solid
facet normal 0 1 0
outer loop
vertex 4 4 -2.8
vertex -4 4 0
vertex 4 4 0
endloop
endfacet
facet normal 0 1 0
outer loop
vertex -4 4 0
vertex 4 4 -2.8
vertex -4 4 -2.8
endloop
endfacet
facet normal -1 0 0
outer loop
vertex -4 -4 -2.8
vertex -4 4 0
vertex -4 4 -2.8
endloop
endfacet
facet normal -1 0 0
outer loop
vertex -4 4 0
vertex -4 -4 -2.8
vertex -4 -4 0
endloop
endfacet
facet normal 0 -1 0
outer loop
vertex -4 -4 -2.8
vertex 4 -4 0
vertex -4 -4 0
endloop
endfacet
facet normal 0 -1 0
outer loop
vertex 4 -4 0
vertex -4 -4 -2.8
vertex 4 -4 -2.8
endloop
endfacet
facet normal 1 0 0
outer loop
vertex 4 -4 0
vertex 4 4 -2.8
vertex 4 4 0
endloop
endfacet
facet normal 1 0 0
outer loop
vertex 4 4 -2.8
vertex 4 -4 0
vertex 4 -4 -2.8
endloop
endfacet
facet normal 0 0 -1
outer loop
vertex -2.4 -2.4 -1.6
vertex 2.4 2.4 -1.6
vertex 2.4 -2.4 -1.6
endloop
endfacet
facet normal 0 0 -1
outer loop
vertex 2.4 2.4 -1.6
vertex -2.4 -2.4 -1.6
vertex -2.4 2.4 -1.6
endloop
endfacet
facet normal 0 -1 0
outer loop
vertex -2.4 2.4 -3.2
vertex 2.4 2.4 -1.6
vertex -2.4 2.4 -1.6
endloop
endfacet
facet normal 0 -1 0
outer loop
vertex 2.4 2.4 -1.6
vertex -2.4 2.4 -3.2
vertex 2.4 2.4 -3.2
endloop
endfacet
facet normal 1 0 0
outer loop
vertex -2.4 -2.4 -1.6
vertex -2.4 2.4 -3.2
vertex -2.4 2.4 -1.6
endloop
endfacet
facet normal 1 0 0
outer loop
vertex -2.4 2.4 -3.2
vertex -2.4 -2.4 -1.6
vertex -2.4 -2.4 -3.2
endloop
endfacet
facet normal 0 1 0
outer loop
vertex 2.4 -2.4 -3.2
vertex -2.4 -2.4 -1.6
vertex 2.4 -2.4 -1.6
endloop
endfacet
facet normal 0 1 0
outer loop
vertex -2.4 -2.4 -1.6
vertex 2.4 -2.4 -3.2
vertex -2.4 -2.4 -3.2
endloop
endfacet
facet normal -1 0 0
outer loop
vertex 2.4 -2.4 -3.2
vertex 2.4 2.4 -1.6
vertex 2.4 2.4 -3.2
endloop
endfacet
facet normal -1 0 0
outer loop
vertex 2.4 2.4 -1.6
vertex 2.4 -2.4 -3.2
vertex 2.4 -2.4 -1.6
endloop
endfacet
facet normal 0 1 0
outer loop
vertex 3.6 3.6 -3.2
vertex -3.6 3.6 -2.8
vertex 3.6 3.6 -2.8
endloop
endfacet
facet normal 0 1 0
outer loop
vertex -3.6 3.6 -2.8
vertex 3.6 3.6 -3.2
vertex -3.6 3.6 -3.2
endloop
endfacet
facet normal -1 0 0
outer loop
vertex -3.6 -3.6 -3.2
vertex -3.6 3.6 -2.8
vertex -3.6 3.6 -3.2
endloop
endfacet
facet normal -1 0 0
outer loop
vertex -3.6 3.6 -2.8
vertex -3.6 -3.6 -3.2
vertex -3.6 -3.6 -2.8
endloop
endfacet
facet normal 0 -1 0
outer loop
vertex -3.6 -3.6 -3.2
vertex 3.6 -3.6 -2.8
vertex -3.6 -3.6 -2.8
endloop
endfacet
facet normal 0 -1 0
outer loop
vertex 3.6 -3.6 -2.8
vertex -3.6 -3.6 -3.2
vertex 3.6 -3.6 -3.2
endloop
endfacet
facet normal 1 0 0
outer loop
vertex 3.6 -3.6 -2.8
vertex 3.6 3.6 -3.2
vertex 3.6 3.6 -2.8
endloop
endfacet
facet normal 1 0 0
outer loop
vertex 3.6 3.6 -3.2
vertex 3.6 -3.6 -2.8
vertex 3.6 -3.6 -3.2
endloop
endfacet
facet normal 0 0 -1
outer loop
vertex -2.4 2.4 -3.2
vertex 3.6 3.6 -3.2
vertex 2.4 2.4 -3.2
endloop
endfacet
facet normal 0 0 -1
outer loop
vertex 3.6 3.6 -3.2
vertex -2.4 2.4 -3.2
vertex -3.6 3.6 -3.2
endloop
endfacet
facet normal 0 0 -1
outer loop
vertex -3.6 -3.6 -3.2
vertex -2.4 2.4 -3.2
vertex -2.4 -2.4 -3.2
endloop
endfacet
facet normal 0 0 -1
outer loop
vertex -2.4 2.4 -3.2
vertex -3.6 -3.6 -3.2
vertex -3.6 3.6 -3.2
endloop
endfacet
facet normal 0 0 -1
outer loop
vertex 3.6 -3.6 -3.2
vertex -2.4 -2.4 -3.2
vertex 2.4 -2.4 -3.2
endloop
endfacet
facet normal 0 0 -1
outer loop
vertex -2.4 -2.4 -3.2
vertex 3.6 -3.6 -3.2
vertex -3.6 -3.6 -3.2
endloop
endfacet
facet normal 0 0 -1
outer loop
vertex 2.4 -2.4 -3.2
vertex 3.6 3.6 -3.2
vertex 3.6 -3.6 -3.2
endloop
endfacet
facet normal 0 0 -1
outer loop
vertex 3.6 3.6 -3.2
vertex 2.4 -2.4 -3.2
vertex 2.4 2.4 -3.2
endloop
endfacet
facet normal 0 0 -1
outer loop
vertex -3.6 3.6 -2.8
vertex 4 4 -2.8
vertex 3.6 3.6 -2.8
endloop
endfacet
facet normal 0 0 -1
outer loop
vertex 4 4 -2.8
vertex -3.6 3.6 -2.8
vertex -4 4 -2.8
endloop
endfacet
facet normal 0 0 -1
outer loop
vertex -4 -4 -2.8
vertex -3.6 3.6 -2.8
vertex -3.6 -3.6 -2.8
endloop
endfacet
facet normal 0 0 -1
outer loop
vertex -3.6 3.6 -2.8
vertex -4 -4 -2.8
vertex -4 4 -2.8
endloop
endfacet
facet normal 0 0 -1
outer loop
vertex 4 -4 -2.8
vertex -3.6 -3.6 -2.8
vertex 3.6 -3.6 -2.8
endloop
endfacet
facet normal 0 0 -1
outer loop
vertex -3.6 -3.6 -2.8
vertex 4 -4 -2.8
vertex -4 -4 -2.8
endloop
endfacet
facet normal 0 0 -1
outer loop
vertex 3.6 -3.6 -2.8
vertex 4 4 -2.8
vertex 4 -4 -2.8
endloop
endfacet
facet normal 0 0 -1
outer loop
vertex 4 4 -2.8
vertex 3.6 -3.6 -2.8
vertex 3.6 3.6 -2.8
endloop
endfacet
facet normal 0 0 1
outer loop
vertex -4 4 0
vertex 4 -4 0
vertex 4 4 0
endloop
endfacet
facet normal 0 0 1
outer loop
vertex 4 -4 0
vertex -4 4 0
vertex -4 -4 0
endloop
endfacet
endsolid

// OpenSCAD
// file: ../p/box5.scad
use <../lib.scad>
function ldraw_lib__box5() = [
// 0 Box with 5 Faces and All Edges
// 0 Name: box5.dat
// 0 Author: James Jessiman
// 0 !LDRAW_ORG Primitive UPDATE 2012-01
// 0 !LICENSE Licensed under CC BY 4.0 : see CAreadme.txt
// 
// 0 BFC CERTIFY CCW
  [0,"BFC","CERTIFY"],
  [0,"BFC","CCW"],
// 
// 0 !HISTORY 2002-04-03 [sbliss] Modified for BFC compliance
// 0 !HISTORY 2002-04-25 [PTadmin] Official Update 2002-02
// 0 !HISTORY 2007-06-24 [PTadmin] Header formatted for Contributor Agreement
// 0 !HISTORY 2008-07-01 [PTadmin] Official Update 2008-01
// 0 !HISTORY 2012-02-16 [Philo] Changed to CCW
// 0 !HISTORY 2012-03-30 [PTadmin] Official Update 2012-01
// 
// 
// 2 24 1 1 1 -1 1 1
  [2,24,1,1,1,-1,1,1],
// 2 24 -1 1 1 -1 1 -1
  [2,24,-1,1,1,-1,1,-1],
// 2 24 -1 1 -1 1 1 -1
  [2,24,-1,1,-1,1,1,-1],
// 2 24 1 1 -1 1 1 1
  [2,24,1,1,-1,1,1,1],
// 2 24 1 0 1 -1 0 1
  [2,24,1,0,1,-1,0,1],
// 2 24 -1 0 1 -1 0 -1
  [2,24,-1,0,1,-1,0,-1],
// 2 24 -1 0 -1 1 0 -1
  [2,24,-1,0,-1,1,0,-1],
// 2 24 1 0 -1 1 0 1
  [2,24,1,0,-1,1,0,1],
// 2 24 1 0 1 1 1 1
  [2,24,1,0,1,1,1,1],
// 2 24 -1 0 1 -1 1 1
  [2,24,-1,0,1,-1,1,1],
// 2 24 1 0 -1 1 1 -1
  [2,24,1,0,-1,1,1,-1],
// 2 24 -1 0 -1 -1 1 -1
  [2,24,-1,0,-1,-1,1,-1],
// 4 16 -1 1 1 1 1 1 1 1 -1 -1 1 -1
  [4,16,-1,1,1,1,1,1,1,1,-1,-1,1,-1],
// 4 16 -1 1 1 -1 0 1 1 0 1 1 1 1
  [4,16,-1,1,1,-1,0,1,1,0,1,1,1,1],
// 4 16 -1 1 -1 -1 0 -1 -1 0 1 -1 1 1
  [4,16,-1,1,-1,-1,0,-1,-1,0,1,-1,1,1],
// 4 16 1 1 -1 1 0 -1 -1 0 -1 -1 1 -1
  [4,16,1,1,-1,1,0,-1,-1,0,-1,-1,1,-1],
// 4 16 1 1 1 1 0 1 1 0 -1 1 1 -1
  [4,16,1,1,1,1,0,1,1,0,-1,1,1,-1],
];
module ldraw_lib__box5(step=0, col=false, unit=2/5, alt=false, line=0.2, solid=!$preview)
    makepoly(ldraw_lib__box5(), step=step, col=col, unit=unit, alt=alt, line=line, solid=solid);
ldraw_lib__box5(line=0.2);
// file: ../p/box4.scad
use <../lib.scad>
function ldraw_lib__box4() = [
// 0 Box with 4 Faces (2 Parallel Pairs) and All Edges
// 0 Name: box4.dat
// 0 Author: James Jessiman
// 0 !LDRAW_ORG Primitive UPDATE 2012-01
// 0 !LICENSE Licensed under CC BY 4.0 : see CAreadme.txt
// 
// 0 BFC CERTIFY CCW
  [0,"BFC","CERTIFY"],
  [0,"BFC","CCW"],
// 
// 0 !HISTORY 2002-04-03 [sbliss] Modified for BFC compliance
// 0 !HISTORY 2002-04-25 [PTadmin] Official Update 2002-02
// 0 !HISTORY 2007-06-24 [PTadmin] Header formatted for Contributor Agreement
// 0 !HISTORY 2008-07-01 [PTadmin] Official Update 2008-01
// 0 !HISTORY 2012-02-16 [Philo] Changed to CCW
// 0 !HISTORY 2012-03-30 [PTadmin] Official Update 2012-01
// 
// 
// 2 24 1 1 1 -1 1 1
  [2,24,1,1,1,-1,1,1],
// 2 24 -1 1 1 -1 1 -1
  [2,24,-1,1,1,-1,1,-1],
// 2 24 -1 1 -1 1 1 -1
  [2,24,-1,1,-1,1,1,-1],
// 2 24 1 1 -1 1 1 1
  [2,24,1,1,-1,1,1,1],
// 2 24 1 0 1 -1 0 1
  [2,24,1,0,1,-1,0,1],
// 2 24 -1 0 1 -1 0 -1
  [2,24,-1,0,1,-1,0,-1],
// 2 24 -1 0 -1 1 0 -1
  [2,24,-1,0,-1,1,0,-1],
// 2 24 1 0 -1 1 0 1
  [2,24,1,0,-1,1,0,1],
// 2 24 1 0 1 1 1 1
  [2,24,1,0,1,1,1,1],
// 2 24 -1 0 1 -1 1 1
  [2,24,-1,0,1,-1,1,1],
// 2 24 1 0 -1 1 1 -1
  [2,24,1,0,-1,1,1,-1],
// 2 24 -1 0 -1 -1 1 -1
  [2,24,-1,0,-1,-1,1,-1],
// 4 16 -1 1 1 -1 0 1 1 0 1 1 1 1
  [4,16,-1,1,1,-1,0,1,1,0,1,1,1,1],
// 4 16 -1 1 -1 -1 0 -1 -1 0 1 -1 1 1
  [4,16,-1,1,-1,-1,0,-1,-1,0,1,-1,1,1],
// 4 16 1 1 -1 1 0 -1 -1 0 -1 -1 1 -1
  [4,16,1,1,-1,1,0,-1,-1,0,-1,-1,1,-1],
// 4 16 1 1 1 1 0 1 1 0 -1 1 1 -1
  [4,16,1,1,1,1,0,1,1,0,-1,1,1,-1],
];
module ldraw_lib__box4(step=0, col=false, unit=2/5, alt=false, line=0.2, solid=!$preview)
    makepoly(ldraw_lib__box4(), step=step, col=col, unit=unit, alt=alt, line=line, solid=solid);
ldraw_lib__box4(line=0.2);
// file: s/3070bs01.scad
use <../../lib.scad>
use <../../p/box4.scad>
use <../../p/box5.scad>
function ldraw_lib__s__3070bs01() = [
// 0 ~Tile  1 x  1 with Groove without Top Face
// 0 Name: s\3070bs01.dat
// 0 Author: Chris Dee [cwdee]
// 0 !LDRAW_ORG Subpart UPDATE 2009-02
// 0 !LICENSE Licensed under CC BY 4.0 : see CAreadme.txt
// 
// 0 BFC CERTIFY CCW
  [0,"BFC","CERTIFY"],
  [0,"BFC","CCW"],
// 
// 0 !HISTORY 2009-09-03 [PTadmin] Official Update 2009-02
// 
// 
// 1 16 0 0 0 10 0 0 0 7 0 0 0 10 box4.dat
  [1,16,0,0,0,10,0,0,0,7,0,0,0,10, ldraw_lib__box4()],
// 0 BFC INVERTNEXT
  [0,"BFC","INVERTNEXT"],
// 1 16 0 8 0 6 0 0 0 -4 0 0 0 6 box5.dat
  [1,16,0,8,0,6,0,0,0,-4,0,0,0,6, ldraw_lib__box5()],
// 1 16 0 7 0 9 0 0 0 1 0 0 0 9 box4.dat
  [1,16,0,7,0,9,0,0,0,1,0,0,0,9, ldraw_lib__box4()],
// 
// 4 16 9 8 9 6 8 6 -6 8 6 -9 8 9
  [4,16,9,8,9,6,8,6,-6,8,6,-9,8,9],
// 4 16 -9 8 9 -6 8 6 -6 8 -6 -9 8 -9
  [4,16,-9,8,9,-6,8,6,-6,8,-6,-9,8,-9],
// 4 16 -9 8 -9 -6 8 -6 6 8 -6 9 8 -9
  [4,16,-9,8,-9,-6,8,-6,6,8,-6,9,8,-9],
// 4 16 9 8 -9 6 8 -6 6 8 6 9 8 9
  [4,16,9,8,-9,6,8,-6,6,8,6,9,8,9],
// 
// 4 16 10 7 10 9 7 9 -9 7 9 -10 7 10
  [4,16,10,7,10,9,7,9,-9,7,9,-10,7,10],
// 4 16 -10 7 10 -9 7 9 -9 7 -9 -10 7 -10
  [4,16,-10,7,10,-9,7,9,-9,7,-9,-10,7,-10],
// 4 16 -10 7 -10 -9 7 -9 9 7 -9 10 7 -10
  [4,16,-10,7,-10,-9,7,-9,9,7,-9,10,7,-10],
// 4 16 10 7 -10 9 7 -9 9 7 9 10 7 10
  [4,16,10,7,-10,9,7,-9,9,7,9,10,7,10],
// 0
];
module ldraw_lib__s__3070bs01(step=0, col=false, unit=2/5, alt=false, line=0.2, solid=!$preview)
    makepoly(ldraw_lib__s__3070bs01(), step=step, col=col, unit=unit, alt=alt, line=line, solid=solid);
ldraw_lib__s__3070bs01(line=0.2);
// file: 3070b.scad
use <../lib.scad>
use <s/3070bs01.scad>
function ldraw_lib__3070b() = [
// 0 Tile  1 x  1 with Groove
// 0 Name: 3070b.dat
// 0 Author: Chris Dee [cwdee]
// 0 !LDRAW_ORG Part UPDATE 2009-02
// 0 !LICENSE Licensed under CC BY 4.0 : see CAreadme.txt
// 
// 0 BFC CERTIFY CW
  [0,"BFC","CERTIFY"],
  [0,"BFC","CW"],
// 
// 0 !KEYWORDS BrickLink 3070
// 
// 0 !HISTORY 2009-09-03 [PTadmin] Official Update 2009-02
// 
// 
// 1 16 0 0 0 1 0 0 0 1 0 0 0 1 s\3070bs01.dat
  [1,16,0,0,0,1,0,0,0,1,0,0,0,1, ldraw_lib__s__3070bs01()],
// 4 16 10 0 10 10 0 -10 -10 0 -10 -10 0 10
  [4,16,10,0,10,10,0,-10,-10,0,-10,-10,0,10],
// 0
];
module ldraw_lib__3070b(step=0, col=false, unit=2/5, alt=false, line=0.2, solid=!$preview)
    makepoly(ldraw_lib__3070b(), step=step, col=col, unit=unit, alt=alt, line=line, solid=solid);
ldraw_lib__3070b(line=0.2);
// main file
use <../lib.scad>
use <3070b.scad>
function ldraw_lib__35403() = [
// 0 =Tile  1 x  1 with Groove
// 0 Name: 35403.dat
// 0 Author: Massimo Maso [Sirio]
// 0 !LDRAW_ORG Part Alias UPDATE 2025-05
// 0 !LICENSE Licensed under CC BY 4.0 : see CAreadme.txt
// 
// 0 BFC CERTIFY CCW
  [0,"BFC","CERTIFY"],
  [0,"BFC","CCW"],
// 
// 0 !KEYWORDS BrickLink 3070, Rebrickable 3070b
// 
// 0 !HISTORY 2025-05-28 [OrionP] Official Update 2025-05
// 
// 1 16 0 0 0 1 0 0 0 1 0 0 0 1 3070b.dat
  [1,16,0,0,0,1,0,0,0,1,0,0,0,1, ldraw_lib__3070b()],
];
module ldraw_lib__35403(step=0, col=false, unit=2/5, alt=false, line=0.2, solid=!$preview)
    makepoly(ldraw_lib__35403(), step=step, col=col, unit=unit, alt=alt, line=line, solid=solid);
ldraw_lib__35403(line=0.2);
